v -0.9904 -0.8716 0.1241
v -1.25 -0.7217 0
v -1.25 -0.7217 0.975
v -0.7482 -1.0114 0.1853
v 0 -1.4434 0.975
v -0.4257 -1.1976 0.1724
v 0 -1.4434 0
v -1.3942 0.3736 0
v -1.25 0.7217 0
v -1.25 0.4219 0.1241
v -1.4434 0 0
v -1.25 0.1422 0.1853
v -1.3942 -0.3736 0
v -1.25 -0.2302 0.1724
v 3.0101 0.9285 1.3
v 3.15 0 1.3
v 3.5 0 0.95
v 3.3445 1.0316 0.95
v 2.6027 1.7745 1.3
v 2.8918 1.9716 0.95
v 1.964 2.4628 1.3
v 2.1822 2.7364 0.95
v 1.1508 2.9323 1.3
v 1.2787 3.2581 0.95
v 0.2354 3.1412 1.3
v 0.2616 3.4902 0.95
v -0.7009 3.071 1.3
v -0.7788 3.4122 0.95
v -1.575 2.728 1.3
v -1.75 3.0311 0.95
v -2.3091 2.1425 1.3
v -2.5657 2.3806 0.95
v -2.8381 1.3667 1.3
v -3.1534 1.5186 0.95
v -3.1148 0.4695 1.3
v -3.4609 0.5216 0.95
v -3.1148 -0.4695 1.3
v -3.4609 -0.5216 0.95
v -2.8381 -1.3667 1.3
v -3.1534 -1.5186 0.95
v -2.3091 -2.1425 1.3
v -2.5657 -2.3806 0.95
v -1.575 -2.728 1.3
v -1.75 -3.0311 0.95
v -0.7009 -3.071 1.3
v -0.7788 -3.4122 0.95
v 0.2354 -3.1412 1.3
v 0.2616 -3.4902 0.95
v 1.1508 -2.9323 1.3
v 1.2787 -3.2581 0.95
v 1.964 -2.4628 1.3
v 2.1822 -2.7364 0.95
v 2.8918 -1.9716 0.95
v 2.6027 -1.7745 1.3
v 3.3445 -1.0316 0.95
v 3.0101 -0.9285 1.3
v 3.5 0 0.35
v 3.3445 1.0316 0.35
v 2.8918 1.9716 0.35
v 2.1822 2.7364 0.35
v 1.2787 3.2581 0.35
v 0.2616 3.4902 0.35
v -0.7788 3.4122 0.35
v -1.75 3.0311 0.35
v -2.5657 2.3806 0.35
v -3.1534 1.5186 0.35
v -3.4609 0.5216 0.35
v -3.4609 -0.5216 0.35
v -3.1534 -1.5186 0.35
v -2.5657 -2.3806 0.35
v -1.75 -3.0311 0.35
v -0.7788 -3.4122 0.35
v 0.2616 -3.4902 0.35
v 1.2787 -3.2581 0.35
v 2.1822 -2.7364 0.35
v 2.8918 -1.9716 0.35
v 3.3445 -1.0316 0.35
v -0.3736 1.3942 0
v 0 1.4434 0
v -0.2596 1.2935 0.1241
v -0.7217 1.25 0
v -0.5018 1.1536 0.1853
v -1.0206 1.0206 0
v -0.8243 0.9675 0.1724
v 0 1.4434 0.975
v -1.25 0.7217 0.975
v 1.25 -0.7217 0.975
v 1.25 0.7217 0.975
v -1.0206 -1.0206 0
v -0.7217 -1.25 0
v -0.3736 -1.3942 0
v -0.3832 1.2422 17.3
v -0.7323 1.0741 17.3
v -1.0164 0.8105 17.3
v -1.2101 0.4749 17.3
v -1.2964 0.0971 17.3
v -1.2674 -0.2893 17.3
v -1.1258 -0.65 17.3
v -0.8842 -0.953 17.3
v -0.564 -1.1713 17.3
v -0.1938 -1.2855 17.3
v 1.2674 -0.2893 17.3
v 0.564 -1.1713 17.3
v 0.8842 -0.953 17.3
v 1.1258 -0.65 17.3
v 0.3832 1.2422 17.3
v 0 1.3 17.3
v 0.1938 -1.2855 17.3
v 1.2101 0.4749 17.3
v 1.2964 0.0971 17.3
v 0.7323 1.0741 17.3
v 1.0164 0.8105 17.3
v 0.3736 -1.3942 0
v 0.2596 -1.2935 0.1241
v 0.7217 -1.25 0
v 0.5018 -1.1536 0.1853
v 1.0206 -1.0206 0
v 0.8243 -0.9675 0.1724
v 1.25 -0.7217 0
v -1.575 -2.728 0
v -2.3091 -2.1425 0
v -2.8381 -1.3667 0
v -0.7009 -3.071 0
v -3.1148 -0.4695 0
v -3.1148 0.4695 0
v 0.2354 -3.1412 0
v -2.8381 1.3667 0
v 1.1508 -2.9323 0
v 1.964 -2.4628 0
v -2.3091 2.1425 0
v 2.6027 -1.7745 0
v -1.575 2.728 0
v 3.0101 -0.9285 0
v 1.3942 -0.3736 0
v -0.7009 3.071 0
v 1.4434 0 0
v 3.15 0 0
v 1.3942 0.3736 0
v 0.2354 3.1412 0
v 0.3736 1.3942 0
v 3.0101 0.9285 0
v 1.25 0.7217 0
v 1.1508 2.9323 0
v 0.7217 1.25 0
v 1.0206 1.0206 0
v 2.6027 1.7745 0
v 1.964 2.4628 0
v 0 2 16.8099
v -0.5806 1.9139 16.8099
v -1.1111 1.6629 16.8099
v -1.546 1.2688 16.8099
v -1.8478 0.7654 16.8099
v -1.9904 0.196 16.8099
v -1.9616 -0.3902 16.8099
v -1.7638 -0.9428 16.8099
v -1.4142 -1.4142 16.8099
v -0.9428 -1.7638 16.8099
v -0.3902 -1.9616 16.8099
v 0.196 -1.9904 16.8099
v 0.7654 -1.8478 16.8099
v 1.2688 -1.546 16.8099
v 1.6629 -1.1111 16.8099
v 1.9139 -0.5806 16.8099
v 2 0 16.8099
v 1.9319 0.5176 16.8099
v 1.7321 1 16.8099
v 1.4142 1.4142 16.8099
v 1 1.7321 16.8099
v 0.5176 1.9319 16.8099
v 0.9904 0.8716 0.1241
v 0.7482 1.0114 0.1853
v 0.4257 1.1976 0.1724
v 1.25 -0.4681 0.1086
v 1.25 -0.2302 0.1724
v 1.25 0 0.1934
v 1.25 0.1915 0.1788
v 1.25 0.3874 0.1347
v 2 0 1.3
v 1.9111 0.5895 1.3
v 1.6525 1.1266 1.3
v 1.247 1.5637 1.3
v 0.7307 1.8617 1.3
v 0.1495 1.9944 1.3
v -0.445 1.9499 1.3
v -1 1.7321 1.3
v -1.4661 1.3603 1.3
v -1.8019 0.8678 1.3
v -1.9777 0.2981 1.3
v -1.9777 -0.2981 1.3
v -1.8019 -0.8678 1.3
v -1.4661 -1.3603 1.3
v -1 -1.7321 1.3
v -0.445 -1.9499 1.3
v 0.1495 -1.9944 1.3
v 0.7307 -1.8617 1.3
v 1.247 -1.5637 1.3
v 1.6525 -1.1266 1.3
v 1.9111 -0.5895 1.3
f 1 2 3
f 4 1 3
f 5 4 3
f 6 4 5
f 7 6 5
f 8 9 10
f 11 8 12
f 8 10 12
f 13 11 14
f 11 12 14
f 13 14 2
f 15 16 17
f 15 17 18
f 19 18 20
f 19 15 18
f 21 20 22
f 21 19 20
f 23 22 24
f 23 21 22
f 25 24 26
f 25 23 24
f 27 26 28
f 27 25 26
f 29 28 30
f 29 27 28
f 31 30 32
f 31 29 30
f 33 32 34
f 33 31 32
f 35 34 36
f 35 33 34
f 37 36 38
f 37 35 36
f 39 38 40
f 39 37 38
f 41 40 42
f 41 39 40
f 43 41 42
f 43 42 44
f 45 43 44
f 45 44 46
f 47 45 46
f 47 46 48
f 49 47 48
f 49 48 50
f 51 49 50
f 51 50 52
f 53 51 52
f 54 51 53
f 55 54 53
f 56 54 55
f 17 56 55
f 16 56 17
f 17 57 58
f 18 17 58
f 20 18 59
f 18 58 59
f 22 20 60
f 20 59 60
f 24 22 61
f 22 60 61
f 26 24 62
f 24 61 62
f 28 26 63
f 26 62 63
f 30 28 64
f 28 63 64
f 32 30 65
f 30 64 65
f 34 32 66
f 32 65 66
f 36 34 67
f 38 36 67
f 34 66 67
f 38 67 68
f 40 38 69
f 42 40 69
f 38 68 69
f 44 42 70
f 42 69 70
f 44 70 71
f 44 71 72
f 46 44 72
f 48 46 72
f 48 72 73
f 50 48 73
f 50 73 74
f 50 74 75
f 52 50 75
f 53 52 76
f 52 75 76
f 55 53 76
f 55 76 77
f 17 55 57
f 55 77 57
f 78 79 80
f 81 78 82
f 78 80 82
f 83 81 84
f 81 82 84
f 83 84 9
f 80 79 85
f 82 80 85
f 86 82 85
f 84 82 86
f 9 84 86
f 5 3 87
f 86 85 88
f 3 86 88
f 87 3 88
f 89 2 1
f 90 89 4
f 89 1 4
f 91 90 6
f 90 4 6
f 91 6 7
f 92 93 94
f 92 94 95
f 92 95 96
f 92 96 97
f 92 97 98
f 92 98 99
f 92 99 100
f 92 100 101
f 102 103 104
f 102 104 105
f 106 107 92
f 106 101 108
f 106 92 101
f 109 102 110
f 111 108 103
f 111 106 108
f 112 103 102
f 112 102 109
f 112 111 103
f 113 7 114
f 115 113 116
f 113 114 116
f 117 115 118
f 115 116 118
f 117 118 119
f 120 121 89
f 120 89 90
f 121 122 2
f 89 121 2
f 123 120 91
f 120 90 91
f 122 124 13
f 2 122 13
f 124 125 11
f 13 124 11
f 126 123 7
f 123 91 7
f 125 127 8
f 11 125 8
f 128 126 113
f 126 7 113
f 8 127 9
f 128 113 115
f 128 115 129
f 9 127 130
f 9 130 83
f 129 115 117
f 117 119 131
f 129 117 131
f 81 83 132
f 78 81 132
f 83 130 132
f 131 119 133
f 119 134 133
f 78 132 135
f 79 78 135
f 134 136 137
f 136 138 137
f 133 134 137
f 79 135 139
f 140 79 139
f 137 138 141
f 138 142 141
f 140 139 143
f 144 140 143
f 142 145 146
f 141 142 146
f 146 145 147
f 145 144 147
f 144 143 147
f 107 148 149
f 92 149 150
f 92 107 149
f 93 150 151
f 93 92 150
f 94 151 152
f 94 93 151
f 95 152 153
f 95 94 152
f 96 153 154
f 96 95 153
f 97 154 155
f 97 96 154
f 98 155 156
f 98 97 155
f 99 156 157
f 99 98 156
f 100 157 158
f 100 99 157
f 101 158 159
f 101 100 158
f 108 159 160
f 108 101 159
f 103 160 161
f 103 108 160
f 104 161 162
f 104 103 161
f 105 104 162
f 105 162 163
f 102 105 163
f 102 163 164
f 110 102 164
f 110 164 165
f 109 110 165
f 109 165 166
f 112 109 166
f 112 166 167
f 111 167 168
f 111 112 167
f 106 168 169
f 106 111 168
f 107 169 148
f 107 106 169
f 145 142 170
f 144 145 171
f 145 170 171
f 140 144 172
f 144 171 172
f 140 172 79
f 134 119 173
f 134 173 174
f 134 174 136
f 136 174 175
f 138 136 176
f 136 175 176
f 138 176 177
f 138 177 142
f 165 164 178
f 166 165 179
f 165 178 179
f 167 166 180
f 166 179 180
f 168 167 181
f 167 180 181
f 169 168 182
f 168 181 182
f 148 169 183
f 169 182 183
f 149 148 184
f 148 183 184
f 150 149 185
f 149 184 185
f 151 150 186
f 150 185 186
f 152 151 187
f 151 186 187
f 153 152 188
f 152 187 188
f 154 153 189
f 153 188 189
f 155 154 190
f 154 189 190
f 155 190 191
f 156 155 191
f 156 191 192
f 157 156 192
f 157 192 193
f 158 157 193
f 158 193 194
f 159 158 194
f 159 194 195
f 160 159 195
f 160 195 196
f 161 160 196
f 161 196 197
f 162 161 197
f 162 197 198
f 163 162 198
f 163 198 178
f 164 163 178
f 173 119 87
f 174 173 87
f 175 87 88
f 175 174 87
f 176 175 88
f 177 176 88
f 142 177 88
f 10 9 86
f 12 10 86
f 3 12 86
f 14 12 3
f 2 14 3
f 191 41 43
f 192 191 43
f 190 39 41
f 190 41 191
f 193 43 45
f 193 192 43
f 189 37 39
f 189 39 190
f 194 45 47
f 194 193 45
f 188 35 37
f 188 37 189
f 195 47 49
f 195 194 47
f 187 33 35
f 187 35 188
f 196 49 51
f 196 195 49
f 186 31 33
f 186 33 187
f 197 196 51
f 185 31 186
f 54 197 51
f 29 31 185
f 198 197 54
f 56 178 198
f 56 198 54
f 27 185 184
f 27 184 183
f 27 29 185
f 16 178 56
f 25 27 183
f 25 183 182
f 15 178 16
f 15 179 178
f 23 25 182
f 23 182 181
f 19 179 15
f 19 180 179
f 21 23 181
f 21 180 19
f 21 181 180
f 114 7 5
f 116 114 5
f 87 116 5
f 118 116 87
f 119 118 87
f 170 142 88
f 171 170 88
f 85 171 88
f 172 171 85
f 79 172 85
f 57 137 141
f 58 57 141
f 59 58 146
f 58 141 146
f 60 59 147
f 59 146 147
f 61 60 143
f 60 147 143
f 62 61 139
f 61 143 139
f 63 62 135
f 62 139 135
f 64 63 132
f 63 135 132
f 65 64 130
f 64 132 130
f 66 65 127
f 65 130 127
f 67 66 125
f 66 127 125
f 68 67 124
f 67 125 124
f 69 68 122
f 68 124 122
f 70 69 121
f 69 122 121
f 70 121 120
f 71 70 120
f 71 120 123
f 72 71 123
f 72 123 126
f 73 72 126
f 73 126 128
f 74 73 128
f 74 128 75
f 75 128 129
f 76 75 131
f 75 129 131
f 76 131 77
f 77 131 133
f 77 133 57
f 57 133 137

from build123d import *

# Parameters (mm, degrees)
SKETCH1_R          = 2
EXTRUDE1_DEPTH     = 17.3
SKETCH6_R          = 3.5
EXTRUDE2_DEPTH     = 1.3
CUT_EXTRUDE1_DEPTH = 0.975
SKETCH8_R          = 1.443375673
CUT_EXTRUDE2_DEPTH = 0.975
CUT_EXTRUDE2_TAPER = 45
CHAMFER1_SIZE      = 0.35


with BuildPart() as part:
    # Sketch1 → Extrude1 (new body)
    with BuildSketch(Plane.XY):
        Circle(SKETCH1_R)
    extrude(amount=EXTRUDE1_DEPTH)

    # Sketch4 → Cut-Revolve1 (revolve, cut)
    with BuildSketch(Plane(origin=(0, 0, 0), x_dir=(0, 0, -1), z_dir=(1, 0, 0))):
        Polygon((-16.809854723, 2), (-17.3, 1.3), (-17.3, 2), align=None)
    revolve(axis=Axis((0, 0, 0), (0, 0, 1)), mode=Mode.SUBTRACT)

    # Sketch6 → Extrude2 (add)
    with BuildSketch(Plane.XY):
        Circle(SKETCH6_R)
    extrude(amount=EXTRUDE2_DEPTH)

    # Sketch7 → Cut-Extrude1 (cut)
    with BuildSketch(Plane.XY):
        Polygon((0, 1.443375673), (-1.25, 0.721687836), (-1.25, -0.721687836), (0, -1.443375673), (1.25, -0.721687836), (1.25, 0.721687836), align=None)
    extrude(amount=CUT_EXTRUDE1_DEPTH, mode=Mode.SUBTRACT)

    # Sketch8 → Cut-Extrude2 (cut)
    with BuildSketch(Plane.XY):
        Circle(SKETCH8_R)
    extrude(amount=CUT_EXTRUDE2_DEPTH, taper=CUT_EXTRUDE2_TAPER, mode=Mode.SUBTRACT)

    # Chamfer1
    chamfer1_edges = [part.edges().sort_by_distance(p)[0] for p in [
        (-3.5, 0, 1.3),
        (-3.5, 0, 0),
    ]]
    chamfer(chamfer1_edges, length=CHAMFER1_SIZE)


solid = part.part
